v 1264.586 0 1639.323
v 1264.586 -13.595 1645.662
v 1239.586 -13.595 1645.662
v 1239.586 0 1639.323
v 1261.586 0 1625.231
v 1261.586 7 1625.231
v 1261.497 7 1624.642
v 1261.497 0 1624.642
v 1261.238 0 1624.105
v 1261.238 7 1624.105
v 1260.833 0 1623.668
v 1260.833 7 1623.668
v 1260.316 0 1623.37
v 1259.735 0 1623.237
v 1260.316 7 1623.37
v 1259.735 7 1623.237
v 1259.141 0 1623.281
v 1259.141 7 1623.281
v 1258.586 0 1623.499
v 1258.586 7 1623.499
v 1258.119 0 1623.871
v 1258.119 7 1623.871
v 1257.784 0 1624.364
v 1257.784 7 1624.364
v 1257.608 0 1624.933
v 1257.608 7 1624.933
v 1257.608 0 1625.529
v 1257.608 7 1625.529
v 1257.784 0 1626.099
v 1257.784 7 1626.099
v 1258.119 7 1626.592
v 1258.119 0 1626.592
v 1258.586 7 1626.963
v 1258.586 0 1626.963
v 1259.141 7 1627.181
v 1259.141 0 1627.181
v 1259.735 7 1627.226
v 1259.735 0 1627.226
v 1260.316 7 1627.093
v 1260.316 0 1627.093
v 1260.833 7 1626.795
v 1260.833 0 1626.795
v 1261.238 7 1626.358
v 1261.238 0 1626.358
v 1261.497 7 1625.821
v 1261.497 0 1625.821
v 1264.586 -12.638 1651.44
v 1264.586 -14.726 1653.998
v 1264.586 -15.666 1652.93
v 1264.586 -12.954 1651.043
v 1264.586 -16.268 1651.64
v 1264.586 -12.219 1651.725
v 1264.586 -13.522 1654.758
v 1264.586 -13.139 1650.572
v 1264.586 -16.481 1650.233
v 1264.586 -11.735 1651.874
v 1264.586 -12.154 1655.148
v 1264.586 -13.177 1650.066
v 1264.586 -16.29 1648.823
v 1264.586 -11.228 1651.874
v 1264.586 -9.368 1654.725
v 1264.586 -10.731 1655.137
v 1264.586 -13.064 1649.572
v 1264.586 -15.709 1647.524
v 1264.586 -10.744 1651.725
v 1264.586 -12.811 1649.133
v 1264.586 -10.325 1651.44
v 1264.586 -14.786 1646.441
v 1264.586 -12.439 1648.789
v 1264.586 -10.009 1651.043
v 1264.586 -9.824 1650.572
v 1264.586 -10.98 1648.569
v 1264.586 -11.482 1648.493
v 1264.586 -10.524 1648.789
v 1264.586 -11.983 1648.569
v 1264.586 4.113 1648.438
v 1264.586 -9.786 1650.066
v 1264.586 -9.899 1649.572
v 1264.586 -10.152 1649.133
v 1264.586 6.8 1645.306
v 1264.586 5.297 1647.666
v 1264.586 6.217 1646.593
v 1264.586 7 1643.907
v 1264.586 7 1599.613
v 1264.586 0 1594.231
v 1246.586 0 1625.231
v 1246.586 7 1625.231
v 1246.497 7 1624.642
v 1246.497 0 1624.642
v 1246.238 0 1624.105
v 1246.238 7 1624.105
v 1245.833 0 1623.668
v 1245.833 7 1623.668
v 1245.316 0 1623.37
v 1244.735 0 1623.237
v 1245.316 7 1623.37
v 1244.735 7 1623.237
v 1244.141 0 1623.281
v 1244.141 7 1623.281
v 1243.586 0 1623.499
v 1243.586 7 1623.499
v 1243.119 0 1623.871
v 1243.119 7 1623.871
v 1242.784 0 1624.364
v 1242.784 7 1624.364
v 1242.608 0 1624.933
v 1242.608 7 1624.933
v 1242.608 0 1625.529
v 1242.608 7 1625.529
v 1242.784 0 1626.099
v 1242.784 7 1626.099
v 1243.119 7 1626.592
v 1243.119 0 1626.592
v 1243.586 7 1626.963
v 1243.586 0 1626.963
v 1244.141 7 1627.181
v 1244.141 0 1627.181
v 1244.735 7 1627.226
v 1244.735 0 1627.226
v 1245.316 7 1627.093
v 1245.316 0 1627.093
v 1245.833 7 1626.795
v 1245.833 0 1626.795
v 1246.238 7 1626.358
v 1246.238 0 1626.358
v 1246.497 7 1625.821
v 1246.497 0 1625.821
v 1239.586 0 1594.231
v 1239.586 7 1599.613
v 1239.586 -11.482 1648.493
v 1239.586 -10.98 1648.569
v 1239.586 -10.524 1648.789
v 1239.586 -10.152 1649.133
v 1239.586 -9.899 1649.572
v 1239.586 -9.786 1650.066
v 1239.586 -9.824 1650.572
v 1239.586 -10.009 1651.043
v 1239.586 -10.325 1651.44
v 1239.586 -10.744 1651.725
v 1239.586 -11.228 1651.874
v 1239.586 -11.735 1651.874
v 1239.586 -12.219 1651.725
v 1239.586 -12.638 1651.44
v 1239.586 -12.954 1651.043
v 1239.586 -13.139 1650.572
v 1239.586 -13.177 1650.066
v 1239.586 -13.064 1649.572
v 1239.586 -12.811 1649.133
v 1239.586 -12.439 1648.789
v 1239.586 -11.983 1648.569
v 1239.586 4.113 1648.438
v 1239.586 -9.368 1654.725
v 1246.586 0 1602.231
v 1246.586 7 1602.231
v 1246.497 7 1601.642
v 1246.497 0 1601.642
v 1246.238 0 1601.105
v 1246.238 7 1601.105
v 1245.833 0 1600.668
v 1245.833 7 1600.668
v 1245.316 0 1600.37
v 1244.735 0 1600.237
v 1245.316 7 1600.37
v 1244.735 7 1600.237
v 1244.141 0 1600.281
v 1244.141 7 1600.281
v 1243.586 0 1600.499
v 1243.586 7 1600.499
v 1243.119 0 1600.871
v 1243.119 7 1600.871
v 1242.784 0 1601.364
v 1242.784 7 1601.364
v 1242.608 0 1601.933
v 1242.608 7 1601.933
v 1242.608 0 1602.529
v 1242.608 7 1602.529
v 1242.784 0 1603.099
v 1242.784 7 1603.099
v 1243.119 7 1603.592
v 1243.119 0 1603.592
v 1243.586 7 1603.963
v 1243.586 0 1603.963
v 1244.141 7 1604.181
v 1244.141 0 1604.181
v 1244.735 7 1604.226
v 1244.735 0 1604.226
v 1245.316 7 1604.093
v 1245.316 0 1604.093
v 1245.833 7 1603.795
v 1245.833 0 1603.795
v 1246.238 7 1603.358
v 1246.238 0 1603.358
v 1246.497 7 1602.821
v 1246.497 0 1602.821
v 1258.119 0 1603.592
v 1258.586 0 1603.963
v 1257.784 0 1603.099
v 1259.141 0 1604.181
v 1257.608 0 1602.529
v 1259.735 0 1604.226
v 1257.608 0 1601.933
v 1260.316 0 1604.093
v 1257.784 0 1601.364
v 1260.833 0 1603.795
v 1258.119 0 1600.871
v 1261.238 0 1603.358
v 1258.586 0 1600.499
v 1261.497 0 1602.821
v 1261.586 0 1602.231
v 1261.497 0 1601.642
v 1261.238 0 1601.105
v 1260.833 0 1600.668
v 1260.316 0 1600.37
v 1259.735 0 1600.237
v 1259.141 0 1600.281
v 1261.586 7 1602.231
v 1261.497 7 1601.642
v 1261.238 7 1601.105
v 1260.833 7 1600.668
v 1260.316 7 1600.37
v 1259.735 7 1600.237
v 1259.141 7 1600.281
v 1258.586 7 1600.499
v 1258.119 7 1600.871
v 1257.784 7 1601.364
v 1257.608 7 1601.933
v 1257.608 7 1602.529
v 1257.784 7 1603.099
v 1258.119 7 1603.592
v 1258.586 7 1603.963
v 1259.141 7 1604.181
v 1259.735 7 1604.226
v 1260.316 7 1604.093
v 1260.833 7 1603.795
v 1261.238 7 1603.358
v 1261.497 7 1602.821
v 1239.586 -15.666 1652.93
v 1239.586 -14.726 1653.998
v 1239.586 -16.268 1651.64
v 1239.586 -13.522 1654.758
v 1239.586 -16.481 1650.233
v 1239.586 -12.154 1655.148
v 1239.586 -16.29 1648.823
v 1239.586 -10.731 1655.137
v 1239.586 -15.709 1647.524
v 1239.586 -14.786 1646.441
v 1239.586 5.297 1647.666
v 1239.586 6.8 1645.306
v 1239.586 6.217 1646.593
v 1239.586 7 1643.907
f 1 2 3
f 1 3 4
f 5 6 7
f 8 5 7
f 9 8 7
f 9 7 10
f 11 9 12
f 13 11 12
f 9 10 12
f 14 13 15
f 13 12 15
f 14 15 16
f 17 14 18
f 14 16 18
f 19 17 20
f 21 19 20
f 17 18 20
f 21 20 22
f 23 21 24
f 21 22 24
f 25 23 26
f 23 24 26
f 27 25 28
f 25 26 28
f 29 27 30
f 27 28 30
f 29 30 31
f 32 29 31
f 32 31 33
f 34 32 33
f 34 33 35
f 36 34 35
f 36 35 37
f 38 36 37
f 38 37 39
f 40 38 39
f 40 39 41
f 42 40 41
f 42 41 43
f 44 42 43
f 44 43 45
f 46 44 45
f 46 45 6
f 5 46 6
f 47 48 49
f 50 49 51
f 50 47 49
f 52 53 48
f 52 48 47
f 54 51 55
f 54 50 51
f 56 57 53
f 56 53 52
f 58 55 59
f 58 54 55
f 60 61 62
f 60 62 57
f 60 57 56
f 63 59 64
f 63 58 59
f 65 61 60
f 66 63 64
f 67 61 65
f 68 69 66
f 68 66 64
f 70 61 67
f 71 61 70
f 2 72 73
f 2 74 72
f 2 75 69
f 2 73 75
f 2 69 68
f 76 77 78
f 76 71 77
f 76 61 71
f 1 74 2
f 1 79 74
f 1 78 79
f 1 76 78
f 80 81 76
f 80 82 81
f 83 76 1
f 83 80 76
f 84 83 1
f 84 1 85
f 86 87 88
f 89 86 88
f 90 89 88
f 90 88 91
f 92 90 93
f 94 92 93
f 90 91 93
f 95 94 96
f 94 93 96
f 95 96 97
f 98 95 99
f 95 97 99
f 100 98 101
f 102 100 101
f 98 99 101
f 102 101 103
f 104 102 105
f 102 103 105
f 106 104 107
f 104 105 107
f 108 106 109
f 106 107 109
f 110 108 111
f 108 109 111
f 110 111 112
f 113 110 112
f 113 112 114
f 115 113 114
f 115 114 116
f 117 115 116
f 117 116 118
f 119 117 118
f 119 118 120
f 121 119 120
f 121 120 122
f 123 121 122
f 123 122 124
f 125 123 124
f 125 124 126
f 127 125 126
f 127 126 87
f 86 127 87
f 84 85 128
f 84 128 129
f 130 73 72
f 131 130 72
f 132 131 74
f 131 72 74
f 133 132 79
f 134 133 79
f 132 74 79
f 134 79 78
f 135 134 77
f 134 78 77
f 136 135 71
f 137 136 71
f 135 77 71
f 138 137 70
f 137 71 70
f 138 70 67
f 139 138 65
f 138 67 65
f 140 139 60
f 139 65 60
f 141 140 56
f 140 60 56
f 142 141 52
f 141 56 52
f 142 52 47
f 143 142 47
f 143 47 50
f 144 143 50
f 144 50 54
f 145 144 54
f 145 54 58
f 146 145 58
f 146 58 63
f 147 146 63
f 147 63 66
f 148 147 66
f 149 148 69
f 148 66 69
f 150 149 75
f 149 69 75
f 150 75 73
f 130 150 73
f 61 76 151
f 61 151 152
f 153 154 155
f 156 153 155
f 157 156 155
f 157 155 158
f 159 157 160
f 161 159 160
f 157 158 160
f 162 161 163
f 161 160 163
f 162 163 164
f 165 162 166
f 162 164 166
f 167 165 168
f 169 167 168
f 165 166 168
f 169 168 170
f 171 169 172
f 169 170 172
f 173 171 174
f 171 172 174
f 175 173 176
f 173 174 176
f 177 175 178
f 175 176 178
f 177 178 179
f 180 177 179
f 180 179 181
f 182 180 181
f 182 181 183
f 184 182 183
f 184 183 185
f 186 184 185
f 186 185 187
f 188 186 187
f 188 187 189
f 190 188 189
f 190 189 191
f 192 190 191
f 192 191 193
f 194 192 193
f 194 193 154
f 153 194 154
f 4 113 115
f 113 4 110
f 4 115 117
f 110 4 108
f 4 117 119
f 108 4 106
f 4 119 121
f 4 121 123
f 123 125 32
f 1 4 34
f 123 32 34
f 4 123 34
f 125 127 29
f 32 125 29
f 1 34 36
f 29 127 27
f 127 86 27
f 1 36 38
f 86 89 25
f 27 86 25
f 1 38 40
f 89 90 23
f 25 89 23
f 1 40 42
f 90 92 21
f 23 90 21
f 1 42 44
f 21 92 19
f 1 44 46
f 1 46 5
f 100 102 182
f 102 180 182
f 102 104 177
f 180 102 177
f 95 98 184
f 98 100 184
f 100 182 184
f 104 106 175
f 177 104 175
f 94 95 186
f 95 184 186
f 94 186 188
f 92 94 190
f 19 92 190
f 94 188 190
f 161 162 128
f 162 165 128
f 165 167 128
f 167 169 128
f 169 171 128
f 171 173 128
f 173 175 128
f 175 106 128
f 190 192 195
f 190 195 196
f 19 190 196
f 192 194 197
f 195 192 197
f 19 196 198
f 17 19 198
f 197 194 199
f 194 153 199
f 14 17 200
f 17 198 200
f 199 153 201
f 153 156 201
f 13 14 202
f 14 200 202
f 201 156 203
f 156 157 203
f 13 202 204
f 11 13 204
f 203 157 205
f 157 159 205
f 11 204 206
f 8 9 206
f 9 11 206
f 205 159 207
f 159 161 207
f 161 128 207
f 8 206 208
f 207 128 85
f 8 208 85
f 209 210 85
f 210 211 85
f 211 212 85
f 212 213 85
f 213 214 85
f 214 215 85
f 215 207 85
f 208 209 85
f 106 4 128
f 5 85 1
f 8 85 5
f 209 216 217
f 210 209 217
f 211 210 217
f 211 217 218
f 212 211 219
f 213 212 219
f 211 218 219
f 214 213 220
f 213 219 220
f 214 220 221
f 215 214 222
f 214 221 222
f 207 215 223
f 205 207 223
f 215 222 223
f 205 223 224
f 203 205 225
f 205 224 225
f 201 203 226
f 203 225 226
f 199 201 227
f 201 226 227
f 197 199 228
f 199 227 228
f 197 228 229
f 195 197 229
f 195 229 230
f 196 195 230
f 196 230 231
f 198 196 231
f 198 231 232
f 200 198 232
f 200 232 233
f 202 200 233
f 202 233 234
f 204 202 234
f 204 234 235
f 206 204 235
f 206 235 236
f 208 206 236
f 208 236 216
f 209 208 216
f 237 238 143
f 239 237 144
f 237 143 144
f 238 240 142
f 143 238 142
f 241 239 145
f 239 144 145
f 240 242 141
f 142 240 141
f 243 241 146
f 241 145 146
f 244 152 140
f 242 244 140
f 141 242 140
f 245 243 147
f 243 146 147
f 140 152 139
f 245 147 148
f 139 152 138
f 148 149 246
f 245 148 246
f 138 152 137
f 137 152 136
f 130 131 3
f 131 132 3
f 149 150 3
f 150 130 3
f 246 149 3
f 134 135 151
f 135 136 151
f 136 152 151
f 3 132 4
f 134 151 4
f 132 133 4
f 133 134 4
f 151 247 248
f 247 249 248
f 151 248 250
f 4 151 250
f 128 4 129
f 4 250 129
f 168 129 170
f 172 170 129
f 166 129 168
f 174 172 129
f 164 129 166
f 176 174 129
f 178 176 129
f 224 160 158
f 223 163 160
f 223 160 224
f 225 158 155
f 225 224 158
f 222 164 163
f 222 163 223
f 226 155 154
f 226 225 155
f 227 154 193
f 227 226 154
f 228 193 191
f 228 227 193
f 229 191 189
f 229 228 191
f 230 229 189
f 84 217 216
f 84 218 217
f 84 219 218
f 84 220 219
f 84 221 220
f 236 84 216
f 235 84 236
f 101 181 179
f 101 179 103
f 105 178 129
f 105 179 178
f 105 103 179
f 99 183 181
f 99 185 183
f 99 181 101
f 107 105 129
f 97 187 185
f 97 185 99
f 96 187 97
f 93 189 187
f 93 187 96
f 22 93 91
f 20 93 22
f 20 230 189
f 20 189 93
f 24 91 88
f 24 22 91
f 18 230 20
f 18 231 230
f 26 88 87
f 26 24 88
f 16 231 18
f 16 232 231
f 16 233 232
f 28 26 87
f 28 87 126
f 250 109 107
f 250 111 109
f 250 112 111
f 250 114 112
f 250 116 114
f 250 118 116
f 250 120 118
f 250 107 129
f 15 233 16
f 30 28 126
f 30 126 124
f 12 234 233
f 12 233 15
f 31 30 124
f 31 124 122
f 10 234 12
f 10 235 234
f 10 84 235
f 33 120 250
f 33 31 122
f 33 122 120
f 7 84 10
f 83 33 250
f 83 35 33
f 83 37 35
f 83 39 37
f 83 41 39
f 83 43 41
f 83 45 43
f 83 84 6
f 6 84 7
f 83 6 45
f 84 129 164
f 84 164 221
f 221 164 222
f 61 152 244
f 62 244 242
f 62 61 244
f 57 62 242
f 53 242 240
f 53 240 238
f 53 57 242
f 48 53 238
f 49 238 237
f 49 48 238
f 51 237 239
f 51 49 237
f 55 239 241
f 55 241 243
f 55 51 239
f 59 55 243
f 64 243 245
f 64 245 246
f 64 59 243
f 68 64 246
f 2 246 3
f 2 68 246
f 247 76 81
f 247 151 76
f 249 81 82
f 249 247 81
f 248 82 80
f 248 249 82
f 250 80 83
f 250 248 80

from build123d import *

# Parameters (mm, degrees)
SKETCH_1_W          = 25
SKETCH_1_H          = 43.91
EXTRUDE_1_DEPTH     = 7
CUT_EXTRUDE_1_DEPTH = 65
SKETCH_3_R          = 2
CUT_EXTRUDE_2_DEPTH = 65
SKETCH_4_W          = 25
SKETCH_4_H          = 7
EXTRUDE_2_DEPTH     = 10
SKETCH_5_R          = 1.7
EXTRUDE_3_DEPTH     = 25
FILLET_1_R          = 5


with BuildPart() as part:
    # Эскиз1 → Бобышка-Вытянуть1 (new body)
    with BuildSketch(Plane(origin=(0, 0, 0), x_dir=(1, 0, 0), z_dir=(0, 1, 0))):
        with Locations((1252.085571953, -1610.16757215)):
            Rectangle(SKETCH_1_W, SKETCH_1_H)
    extrude(amount=EXTRUDE_1_DEPTH)

    # Эскиз2 → Вырез-Вытянуть1 (cut)
    with BuildSketch(Plane(origin=(1264.585571953, 0, 0), x_dir=(0, 0, -1), z_dir=(1, 0, 0))):
        Polygon((-1594.231269333, 0), (-1599.613127302, 7), (-1588.127511269, 9.94842477), (-1585.312996238, -1.015544634), align=None)
    extrude(amount=-CUT_EXTRUDE_1_DEPTH, mode=Mode.SUBTRACT)

    # Эскиз3 → Вырез-Вытянуть2 (cut)
    with BuildSketch(Plane(origin=(0, 7, 0), x_dir=(1, 0, 0), z_dir=(0, 1, 0))):
        with Locations((1259.585571953, -1602.231269333)):
            Circle(SKETCH_3_R)
        with Locations((1259.585571953, -1625.231269333)):
            Circle(SKETCH_3_R)
        with Locations((1244.585571953, -1602.231269333)):
            Circle(SKETCH_3_R)
        with Locations((1244.585571953, -1625.231269333)):
            Circle(SKETCH_3_R)
    extrude(amount=-CUT_EXTRUDE_2_DEPTH, mode=Mode.SUBTRACT)

    # Эскиз4 → Бобышка-Вытянуть2 (add)
    with BuildSketch(Plane.XY.offset(1632.12257215)):
        with Locations((1252.085571953, 3.5)):
            Rectangle(SKETCH_4_W, SKETCH_4_H)
    extrude(amount=EXTRUDE_2_DEPTH)

    # Эскиз5 → Бобышка-Вытянуть3 (add)
    with BuildSketch(Plane(origin=(1264.585571953, 0, 0), x_dir=(0, 0, -1), z_dir=(1, 0, 0))):
        with BuildLine():
            Line((-1645.661846077, -13.594616806), (-1639.32257215, 0))
            Line((-1639.32257215, 0), (-1642.12257215, 7))
            Line((-1642.12257215, 7), (-1647.092197733, 7))
            Line((-1647.092197733, 7), (-1654.724923947, -9.368434188))
            ThreePointArc((-1654.724923947, -9.368434188), (-1652.30647632, -16.013064432), (-1645.661846077, -13.594616806))
        make_face()
        with Locations((-1650.193385012, -11.481525497)):
            Circle(SKETCH_5_R, mode=Mode.SUBTRACT)
    extrude(amount=-EXTRUDE_3_DEPTH)

    # Скругление1
    fillet_1_edges = [part.edges().sort_by_distance(p)[0] for p in [
        (1252.085571953, 7, 1647.092197733),
    ]]
    fillet(fillet_1_edges, radius=FILLET_1_R)


solid = part.part
